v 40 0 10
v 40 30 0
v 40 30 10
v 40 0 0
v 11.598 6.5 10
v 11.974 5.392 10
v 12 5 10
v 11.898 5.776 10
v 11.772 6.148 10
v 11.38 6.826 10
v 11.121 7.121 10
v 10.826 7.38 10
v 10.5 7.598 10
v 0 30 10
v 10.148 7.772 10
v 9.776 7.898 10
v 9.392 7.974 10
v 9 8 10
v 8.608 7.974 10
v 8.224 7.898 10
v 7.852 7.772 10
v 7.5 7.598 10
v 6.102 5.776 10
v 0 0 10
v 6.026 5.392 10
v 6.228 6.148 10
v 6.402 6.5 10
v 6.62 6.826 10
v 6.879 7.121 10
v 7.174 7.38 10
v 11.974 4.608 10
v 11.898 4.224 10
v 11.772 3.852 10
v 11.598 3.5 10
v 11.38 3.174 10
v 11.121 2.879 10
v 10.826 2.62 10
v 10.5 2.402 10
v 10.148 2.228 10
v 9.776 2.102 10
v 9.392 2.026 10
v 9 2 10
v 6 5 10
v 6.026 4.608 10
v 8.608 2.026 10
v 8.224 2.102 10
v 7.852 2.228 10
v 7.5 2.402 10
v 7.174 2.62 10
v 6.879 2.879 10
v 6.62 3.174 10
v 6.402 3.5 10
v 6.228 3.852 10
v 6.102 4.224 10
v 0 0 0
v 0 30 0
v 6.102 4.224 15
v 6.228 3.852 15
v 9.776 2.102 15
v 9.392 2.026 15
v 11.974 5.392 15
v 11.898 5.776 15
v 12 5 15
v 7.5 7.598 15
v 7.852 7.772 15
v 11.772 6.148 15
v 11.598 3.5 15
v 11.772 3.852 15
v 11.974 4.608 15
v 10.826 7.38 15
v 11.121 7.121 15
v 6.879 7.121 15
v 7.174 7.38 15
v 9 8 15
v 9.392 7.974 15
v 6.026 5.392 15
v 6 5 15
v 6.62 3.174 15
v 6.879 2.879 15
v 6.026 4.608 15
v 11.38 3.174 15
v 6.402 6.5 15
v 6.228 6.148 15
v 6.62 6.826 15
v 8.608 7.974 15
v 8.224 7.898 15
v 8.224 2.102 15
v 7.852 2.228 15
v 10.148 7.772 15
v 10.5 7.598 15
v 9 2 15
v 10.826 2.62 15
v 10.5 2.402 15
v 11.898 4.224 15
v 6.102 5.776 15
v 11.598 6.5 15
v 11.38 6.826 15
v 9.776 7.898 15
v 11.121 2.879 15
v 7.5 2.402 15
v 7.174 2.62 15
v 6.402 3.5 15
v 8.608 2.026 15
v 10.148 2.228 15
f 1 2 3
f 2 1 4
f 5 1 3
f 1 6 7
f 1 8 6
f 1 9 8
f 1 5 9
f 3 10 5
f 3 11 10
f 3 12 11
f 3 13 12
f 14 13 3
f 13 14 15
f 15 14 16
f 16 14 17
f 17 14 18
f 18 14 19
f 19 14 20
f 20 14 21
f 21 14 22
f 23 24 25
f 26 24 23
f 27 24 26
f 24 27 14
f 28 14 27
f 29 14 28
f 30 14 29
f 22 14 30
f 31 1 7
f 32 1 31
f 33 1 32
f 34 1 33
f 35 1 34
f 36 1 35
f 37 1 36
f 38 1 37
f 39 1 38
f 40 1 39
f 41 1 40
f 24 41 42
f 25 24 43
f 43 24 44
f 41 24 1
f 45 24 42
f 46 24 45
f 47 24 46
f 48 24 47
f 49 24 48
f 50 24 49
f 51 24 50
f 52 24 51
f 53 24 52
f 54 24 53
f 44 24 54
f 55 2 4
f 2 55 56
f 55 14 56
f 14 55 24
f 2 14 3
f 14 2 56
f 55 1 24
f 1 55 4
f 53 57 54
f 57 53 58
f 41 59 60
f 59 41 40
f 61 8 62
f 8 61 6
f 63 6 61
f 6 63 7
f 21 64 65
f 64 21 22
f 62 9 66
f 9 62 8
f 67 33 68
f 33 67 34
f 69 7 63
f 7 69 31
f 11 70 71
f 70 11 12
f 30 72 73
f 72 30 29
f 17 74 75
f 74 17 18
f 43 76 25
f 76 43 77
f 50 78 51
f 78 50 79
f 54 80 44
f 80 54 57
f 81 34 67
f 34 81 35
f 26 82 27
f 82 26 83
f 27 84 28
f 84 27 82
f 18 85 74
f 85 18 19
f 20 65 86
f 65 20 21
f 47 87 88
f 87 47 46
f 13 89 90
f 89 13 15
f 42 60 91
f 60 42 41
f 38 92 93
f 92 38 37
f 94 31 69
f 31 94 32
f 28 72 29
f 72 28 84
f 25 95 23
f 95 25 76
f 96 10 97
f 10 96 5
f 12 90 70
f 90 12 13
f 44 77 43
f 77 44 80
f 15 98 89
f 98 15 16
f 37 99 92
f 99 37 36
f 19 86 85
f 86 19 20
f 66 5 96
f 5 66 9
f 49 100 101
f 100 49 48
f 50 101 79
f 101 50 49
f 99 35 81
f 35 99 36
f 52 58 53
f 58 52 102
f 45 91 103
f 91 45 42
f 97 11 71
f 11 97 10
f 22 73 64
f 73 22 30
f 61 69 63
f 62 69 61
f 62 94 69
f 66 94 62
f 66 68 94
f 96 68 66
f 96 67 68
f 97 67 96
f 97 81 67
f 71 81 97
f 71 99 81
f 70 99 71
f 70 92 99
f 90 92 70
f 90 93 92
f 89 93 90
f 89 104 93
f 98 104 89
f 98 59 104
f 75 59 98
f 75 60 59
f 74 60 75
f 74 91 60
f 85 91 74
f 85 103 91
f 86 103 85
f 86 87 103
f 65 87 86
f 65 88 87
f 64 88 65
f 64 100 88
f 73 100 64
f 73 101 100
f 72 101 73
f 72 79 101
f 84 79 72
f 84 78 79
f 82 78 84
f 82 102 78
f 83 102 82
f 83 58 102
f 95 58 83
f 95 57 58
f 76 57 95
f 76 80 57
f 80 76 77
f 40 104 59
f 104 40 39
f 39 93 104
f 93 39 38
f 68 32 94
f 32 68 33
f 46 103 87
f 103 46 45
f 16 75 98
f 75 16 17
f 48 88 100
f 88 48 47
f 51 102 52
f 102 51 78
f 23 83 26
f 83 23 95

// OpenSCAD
// units=mm — generated by scad_emitter.py
// part=unnamed
$fn = 48;

union() { cube([40, 30, 10]); translate([9, 5, 9.5]) rotate([0, 0, 0]) cylinder(h=5.5, r=3, $fn=$fn); }
